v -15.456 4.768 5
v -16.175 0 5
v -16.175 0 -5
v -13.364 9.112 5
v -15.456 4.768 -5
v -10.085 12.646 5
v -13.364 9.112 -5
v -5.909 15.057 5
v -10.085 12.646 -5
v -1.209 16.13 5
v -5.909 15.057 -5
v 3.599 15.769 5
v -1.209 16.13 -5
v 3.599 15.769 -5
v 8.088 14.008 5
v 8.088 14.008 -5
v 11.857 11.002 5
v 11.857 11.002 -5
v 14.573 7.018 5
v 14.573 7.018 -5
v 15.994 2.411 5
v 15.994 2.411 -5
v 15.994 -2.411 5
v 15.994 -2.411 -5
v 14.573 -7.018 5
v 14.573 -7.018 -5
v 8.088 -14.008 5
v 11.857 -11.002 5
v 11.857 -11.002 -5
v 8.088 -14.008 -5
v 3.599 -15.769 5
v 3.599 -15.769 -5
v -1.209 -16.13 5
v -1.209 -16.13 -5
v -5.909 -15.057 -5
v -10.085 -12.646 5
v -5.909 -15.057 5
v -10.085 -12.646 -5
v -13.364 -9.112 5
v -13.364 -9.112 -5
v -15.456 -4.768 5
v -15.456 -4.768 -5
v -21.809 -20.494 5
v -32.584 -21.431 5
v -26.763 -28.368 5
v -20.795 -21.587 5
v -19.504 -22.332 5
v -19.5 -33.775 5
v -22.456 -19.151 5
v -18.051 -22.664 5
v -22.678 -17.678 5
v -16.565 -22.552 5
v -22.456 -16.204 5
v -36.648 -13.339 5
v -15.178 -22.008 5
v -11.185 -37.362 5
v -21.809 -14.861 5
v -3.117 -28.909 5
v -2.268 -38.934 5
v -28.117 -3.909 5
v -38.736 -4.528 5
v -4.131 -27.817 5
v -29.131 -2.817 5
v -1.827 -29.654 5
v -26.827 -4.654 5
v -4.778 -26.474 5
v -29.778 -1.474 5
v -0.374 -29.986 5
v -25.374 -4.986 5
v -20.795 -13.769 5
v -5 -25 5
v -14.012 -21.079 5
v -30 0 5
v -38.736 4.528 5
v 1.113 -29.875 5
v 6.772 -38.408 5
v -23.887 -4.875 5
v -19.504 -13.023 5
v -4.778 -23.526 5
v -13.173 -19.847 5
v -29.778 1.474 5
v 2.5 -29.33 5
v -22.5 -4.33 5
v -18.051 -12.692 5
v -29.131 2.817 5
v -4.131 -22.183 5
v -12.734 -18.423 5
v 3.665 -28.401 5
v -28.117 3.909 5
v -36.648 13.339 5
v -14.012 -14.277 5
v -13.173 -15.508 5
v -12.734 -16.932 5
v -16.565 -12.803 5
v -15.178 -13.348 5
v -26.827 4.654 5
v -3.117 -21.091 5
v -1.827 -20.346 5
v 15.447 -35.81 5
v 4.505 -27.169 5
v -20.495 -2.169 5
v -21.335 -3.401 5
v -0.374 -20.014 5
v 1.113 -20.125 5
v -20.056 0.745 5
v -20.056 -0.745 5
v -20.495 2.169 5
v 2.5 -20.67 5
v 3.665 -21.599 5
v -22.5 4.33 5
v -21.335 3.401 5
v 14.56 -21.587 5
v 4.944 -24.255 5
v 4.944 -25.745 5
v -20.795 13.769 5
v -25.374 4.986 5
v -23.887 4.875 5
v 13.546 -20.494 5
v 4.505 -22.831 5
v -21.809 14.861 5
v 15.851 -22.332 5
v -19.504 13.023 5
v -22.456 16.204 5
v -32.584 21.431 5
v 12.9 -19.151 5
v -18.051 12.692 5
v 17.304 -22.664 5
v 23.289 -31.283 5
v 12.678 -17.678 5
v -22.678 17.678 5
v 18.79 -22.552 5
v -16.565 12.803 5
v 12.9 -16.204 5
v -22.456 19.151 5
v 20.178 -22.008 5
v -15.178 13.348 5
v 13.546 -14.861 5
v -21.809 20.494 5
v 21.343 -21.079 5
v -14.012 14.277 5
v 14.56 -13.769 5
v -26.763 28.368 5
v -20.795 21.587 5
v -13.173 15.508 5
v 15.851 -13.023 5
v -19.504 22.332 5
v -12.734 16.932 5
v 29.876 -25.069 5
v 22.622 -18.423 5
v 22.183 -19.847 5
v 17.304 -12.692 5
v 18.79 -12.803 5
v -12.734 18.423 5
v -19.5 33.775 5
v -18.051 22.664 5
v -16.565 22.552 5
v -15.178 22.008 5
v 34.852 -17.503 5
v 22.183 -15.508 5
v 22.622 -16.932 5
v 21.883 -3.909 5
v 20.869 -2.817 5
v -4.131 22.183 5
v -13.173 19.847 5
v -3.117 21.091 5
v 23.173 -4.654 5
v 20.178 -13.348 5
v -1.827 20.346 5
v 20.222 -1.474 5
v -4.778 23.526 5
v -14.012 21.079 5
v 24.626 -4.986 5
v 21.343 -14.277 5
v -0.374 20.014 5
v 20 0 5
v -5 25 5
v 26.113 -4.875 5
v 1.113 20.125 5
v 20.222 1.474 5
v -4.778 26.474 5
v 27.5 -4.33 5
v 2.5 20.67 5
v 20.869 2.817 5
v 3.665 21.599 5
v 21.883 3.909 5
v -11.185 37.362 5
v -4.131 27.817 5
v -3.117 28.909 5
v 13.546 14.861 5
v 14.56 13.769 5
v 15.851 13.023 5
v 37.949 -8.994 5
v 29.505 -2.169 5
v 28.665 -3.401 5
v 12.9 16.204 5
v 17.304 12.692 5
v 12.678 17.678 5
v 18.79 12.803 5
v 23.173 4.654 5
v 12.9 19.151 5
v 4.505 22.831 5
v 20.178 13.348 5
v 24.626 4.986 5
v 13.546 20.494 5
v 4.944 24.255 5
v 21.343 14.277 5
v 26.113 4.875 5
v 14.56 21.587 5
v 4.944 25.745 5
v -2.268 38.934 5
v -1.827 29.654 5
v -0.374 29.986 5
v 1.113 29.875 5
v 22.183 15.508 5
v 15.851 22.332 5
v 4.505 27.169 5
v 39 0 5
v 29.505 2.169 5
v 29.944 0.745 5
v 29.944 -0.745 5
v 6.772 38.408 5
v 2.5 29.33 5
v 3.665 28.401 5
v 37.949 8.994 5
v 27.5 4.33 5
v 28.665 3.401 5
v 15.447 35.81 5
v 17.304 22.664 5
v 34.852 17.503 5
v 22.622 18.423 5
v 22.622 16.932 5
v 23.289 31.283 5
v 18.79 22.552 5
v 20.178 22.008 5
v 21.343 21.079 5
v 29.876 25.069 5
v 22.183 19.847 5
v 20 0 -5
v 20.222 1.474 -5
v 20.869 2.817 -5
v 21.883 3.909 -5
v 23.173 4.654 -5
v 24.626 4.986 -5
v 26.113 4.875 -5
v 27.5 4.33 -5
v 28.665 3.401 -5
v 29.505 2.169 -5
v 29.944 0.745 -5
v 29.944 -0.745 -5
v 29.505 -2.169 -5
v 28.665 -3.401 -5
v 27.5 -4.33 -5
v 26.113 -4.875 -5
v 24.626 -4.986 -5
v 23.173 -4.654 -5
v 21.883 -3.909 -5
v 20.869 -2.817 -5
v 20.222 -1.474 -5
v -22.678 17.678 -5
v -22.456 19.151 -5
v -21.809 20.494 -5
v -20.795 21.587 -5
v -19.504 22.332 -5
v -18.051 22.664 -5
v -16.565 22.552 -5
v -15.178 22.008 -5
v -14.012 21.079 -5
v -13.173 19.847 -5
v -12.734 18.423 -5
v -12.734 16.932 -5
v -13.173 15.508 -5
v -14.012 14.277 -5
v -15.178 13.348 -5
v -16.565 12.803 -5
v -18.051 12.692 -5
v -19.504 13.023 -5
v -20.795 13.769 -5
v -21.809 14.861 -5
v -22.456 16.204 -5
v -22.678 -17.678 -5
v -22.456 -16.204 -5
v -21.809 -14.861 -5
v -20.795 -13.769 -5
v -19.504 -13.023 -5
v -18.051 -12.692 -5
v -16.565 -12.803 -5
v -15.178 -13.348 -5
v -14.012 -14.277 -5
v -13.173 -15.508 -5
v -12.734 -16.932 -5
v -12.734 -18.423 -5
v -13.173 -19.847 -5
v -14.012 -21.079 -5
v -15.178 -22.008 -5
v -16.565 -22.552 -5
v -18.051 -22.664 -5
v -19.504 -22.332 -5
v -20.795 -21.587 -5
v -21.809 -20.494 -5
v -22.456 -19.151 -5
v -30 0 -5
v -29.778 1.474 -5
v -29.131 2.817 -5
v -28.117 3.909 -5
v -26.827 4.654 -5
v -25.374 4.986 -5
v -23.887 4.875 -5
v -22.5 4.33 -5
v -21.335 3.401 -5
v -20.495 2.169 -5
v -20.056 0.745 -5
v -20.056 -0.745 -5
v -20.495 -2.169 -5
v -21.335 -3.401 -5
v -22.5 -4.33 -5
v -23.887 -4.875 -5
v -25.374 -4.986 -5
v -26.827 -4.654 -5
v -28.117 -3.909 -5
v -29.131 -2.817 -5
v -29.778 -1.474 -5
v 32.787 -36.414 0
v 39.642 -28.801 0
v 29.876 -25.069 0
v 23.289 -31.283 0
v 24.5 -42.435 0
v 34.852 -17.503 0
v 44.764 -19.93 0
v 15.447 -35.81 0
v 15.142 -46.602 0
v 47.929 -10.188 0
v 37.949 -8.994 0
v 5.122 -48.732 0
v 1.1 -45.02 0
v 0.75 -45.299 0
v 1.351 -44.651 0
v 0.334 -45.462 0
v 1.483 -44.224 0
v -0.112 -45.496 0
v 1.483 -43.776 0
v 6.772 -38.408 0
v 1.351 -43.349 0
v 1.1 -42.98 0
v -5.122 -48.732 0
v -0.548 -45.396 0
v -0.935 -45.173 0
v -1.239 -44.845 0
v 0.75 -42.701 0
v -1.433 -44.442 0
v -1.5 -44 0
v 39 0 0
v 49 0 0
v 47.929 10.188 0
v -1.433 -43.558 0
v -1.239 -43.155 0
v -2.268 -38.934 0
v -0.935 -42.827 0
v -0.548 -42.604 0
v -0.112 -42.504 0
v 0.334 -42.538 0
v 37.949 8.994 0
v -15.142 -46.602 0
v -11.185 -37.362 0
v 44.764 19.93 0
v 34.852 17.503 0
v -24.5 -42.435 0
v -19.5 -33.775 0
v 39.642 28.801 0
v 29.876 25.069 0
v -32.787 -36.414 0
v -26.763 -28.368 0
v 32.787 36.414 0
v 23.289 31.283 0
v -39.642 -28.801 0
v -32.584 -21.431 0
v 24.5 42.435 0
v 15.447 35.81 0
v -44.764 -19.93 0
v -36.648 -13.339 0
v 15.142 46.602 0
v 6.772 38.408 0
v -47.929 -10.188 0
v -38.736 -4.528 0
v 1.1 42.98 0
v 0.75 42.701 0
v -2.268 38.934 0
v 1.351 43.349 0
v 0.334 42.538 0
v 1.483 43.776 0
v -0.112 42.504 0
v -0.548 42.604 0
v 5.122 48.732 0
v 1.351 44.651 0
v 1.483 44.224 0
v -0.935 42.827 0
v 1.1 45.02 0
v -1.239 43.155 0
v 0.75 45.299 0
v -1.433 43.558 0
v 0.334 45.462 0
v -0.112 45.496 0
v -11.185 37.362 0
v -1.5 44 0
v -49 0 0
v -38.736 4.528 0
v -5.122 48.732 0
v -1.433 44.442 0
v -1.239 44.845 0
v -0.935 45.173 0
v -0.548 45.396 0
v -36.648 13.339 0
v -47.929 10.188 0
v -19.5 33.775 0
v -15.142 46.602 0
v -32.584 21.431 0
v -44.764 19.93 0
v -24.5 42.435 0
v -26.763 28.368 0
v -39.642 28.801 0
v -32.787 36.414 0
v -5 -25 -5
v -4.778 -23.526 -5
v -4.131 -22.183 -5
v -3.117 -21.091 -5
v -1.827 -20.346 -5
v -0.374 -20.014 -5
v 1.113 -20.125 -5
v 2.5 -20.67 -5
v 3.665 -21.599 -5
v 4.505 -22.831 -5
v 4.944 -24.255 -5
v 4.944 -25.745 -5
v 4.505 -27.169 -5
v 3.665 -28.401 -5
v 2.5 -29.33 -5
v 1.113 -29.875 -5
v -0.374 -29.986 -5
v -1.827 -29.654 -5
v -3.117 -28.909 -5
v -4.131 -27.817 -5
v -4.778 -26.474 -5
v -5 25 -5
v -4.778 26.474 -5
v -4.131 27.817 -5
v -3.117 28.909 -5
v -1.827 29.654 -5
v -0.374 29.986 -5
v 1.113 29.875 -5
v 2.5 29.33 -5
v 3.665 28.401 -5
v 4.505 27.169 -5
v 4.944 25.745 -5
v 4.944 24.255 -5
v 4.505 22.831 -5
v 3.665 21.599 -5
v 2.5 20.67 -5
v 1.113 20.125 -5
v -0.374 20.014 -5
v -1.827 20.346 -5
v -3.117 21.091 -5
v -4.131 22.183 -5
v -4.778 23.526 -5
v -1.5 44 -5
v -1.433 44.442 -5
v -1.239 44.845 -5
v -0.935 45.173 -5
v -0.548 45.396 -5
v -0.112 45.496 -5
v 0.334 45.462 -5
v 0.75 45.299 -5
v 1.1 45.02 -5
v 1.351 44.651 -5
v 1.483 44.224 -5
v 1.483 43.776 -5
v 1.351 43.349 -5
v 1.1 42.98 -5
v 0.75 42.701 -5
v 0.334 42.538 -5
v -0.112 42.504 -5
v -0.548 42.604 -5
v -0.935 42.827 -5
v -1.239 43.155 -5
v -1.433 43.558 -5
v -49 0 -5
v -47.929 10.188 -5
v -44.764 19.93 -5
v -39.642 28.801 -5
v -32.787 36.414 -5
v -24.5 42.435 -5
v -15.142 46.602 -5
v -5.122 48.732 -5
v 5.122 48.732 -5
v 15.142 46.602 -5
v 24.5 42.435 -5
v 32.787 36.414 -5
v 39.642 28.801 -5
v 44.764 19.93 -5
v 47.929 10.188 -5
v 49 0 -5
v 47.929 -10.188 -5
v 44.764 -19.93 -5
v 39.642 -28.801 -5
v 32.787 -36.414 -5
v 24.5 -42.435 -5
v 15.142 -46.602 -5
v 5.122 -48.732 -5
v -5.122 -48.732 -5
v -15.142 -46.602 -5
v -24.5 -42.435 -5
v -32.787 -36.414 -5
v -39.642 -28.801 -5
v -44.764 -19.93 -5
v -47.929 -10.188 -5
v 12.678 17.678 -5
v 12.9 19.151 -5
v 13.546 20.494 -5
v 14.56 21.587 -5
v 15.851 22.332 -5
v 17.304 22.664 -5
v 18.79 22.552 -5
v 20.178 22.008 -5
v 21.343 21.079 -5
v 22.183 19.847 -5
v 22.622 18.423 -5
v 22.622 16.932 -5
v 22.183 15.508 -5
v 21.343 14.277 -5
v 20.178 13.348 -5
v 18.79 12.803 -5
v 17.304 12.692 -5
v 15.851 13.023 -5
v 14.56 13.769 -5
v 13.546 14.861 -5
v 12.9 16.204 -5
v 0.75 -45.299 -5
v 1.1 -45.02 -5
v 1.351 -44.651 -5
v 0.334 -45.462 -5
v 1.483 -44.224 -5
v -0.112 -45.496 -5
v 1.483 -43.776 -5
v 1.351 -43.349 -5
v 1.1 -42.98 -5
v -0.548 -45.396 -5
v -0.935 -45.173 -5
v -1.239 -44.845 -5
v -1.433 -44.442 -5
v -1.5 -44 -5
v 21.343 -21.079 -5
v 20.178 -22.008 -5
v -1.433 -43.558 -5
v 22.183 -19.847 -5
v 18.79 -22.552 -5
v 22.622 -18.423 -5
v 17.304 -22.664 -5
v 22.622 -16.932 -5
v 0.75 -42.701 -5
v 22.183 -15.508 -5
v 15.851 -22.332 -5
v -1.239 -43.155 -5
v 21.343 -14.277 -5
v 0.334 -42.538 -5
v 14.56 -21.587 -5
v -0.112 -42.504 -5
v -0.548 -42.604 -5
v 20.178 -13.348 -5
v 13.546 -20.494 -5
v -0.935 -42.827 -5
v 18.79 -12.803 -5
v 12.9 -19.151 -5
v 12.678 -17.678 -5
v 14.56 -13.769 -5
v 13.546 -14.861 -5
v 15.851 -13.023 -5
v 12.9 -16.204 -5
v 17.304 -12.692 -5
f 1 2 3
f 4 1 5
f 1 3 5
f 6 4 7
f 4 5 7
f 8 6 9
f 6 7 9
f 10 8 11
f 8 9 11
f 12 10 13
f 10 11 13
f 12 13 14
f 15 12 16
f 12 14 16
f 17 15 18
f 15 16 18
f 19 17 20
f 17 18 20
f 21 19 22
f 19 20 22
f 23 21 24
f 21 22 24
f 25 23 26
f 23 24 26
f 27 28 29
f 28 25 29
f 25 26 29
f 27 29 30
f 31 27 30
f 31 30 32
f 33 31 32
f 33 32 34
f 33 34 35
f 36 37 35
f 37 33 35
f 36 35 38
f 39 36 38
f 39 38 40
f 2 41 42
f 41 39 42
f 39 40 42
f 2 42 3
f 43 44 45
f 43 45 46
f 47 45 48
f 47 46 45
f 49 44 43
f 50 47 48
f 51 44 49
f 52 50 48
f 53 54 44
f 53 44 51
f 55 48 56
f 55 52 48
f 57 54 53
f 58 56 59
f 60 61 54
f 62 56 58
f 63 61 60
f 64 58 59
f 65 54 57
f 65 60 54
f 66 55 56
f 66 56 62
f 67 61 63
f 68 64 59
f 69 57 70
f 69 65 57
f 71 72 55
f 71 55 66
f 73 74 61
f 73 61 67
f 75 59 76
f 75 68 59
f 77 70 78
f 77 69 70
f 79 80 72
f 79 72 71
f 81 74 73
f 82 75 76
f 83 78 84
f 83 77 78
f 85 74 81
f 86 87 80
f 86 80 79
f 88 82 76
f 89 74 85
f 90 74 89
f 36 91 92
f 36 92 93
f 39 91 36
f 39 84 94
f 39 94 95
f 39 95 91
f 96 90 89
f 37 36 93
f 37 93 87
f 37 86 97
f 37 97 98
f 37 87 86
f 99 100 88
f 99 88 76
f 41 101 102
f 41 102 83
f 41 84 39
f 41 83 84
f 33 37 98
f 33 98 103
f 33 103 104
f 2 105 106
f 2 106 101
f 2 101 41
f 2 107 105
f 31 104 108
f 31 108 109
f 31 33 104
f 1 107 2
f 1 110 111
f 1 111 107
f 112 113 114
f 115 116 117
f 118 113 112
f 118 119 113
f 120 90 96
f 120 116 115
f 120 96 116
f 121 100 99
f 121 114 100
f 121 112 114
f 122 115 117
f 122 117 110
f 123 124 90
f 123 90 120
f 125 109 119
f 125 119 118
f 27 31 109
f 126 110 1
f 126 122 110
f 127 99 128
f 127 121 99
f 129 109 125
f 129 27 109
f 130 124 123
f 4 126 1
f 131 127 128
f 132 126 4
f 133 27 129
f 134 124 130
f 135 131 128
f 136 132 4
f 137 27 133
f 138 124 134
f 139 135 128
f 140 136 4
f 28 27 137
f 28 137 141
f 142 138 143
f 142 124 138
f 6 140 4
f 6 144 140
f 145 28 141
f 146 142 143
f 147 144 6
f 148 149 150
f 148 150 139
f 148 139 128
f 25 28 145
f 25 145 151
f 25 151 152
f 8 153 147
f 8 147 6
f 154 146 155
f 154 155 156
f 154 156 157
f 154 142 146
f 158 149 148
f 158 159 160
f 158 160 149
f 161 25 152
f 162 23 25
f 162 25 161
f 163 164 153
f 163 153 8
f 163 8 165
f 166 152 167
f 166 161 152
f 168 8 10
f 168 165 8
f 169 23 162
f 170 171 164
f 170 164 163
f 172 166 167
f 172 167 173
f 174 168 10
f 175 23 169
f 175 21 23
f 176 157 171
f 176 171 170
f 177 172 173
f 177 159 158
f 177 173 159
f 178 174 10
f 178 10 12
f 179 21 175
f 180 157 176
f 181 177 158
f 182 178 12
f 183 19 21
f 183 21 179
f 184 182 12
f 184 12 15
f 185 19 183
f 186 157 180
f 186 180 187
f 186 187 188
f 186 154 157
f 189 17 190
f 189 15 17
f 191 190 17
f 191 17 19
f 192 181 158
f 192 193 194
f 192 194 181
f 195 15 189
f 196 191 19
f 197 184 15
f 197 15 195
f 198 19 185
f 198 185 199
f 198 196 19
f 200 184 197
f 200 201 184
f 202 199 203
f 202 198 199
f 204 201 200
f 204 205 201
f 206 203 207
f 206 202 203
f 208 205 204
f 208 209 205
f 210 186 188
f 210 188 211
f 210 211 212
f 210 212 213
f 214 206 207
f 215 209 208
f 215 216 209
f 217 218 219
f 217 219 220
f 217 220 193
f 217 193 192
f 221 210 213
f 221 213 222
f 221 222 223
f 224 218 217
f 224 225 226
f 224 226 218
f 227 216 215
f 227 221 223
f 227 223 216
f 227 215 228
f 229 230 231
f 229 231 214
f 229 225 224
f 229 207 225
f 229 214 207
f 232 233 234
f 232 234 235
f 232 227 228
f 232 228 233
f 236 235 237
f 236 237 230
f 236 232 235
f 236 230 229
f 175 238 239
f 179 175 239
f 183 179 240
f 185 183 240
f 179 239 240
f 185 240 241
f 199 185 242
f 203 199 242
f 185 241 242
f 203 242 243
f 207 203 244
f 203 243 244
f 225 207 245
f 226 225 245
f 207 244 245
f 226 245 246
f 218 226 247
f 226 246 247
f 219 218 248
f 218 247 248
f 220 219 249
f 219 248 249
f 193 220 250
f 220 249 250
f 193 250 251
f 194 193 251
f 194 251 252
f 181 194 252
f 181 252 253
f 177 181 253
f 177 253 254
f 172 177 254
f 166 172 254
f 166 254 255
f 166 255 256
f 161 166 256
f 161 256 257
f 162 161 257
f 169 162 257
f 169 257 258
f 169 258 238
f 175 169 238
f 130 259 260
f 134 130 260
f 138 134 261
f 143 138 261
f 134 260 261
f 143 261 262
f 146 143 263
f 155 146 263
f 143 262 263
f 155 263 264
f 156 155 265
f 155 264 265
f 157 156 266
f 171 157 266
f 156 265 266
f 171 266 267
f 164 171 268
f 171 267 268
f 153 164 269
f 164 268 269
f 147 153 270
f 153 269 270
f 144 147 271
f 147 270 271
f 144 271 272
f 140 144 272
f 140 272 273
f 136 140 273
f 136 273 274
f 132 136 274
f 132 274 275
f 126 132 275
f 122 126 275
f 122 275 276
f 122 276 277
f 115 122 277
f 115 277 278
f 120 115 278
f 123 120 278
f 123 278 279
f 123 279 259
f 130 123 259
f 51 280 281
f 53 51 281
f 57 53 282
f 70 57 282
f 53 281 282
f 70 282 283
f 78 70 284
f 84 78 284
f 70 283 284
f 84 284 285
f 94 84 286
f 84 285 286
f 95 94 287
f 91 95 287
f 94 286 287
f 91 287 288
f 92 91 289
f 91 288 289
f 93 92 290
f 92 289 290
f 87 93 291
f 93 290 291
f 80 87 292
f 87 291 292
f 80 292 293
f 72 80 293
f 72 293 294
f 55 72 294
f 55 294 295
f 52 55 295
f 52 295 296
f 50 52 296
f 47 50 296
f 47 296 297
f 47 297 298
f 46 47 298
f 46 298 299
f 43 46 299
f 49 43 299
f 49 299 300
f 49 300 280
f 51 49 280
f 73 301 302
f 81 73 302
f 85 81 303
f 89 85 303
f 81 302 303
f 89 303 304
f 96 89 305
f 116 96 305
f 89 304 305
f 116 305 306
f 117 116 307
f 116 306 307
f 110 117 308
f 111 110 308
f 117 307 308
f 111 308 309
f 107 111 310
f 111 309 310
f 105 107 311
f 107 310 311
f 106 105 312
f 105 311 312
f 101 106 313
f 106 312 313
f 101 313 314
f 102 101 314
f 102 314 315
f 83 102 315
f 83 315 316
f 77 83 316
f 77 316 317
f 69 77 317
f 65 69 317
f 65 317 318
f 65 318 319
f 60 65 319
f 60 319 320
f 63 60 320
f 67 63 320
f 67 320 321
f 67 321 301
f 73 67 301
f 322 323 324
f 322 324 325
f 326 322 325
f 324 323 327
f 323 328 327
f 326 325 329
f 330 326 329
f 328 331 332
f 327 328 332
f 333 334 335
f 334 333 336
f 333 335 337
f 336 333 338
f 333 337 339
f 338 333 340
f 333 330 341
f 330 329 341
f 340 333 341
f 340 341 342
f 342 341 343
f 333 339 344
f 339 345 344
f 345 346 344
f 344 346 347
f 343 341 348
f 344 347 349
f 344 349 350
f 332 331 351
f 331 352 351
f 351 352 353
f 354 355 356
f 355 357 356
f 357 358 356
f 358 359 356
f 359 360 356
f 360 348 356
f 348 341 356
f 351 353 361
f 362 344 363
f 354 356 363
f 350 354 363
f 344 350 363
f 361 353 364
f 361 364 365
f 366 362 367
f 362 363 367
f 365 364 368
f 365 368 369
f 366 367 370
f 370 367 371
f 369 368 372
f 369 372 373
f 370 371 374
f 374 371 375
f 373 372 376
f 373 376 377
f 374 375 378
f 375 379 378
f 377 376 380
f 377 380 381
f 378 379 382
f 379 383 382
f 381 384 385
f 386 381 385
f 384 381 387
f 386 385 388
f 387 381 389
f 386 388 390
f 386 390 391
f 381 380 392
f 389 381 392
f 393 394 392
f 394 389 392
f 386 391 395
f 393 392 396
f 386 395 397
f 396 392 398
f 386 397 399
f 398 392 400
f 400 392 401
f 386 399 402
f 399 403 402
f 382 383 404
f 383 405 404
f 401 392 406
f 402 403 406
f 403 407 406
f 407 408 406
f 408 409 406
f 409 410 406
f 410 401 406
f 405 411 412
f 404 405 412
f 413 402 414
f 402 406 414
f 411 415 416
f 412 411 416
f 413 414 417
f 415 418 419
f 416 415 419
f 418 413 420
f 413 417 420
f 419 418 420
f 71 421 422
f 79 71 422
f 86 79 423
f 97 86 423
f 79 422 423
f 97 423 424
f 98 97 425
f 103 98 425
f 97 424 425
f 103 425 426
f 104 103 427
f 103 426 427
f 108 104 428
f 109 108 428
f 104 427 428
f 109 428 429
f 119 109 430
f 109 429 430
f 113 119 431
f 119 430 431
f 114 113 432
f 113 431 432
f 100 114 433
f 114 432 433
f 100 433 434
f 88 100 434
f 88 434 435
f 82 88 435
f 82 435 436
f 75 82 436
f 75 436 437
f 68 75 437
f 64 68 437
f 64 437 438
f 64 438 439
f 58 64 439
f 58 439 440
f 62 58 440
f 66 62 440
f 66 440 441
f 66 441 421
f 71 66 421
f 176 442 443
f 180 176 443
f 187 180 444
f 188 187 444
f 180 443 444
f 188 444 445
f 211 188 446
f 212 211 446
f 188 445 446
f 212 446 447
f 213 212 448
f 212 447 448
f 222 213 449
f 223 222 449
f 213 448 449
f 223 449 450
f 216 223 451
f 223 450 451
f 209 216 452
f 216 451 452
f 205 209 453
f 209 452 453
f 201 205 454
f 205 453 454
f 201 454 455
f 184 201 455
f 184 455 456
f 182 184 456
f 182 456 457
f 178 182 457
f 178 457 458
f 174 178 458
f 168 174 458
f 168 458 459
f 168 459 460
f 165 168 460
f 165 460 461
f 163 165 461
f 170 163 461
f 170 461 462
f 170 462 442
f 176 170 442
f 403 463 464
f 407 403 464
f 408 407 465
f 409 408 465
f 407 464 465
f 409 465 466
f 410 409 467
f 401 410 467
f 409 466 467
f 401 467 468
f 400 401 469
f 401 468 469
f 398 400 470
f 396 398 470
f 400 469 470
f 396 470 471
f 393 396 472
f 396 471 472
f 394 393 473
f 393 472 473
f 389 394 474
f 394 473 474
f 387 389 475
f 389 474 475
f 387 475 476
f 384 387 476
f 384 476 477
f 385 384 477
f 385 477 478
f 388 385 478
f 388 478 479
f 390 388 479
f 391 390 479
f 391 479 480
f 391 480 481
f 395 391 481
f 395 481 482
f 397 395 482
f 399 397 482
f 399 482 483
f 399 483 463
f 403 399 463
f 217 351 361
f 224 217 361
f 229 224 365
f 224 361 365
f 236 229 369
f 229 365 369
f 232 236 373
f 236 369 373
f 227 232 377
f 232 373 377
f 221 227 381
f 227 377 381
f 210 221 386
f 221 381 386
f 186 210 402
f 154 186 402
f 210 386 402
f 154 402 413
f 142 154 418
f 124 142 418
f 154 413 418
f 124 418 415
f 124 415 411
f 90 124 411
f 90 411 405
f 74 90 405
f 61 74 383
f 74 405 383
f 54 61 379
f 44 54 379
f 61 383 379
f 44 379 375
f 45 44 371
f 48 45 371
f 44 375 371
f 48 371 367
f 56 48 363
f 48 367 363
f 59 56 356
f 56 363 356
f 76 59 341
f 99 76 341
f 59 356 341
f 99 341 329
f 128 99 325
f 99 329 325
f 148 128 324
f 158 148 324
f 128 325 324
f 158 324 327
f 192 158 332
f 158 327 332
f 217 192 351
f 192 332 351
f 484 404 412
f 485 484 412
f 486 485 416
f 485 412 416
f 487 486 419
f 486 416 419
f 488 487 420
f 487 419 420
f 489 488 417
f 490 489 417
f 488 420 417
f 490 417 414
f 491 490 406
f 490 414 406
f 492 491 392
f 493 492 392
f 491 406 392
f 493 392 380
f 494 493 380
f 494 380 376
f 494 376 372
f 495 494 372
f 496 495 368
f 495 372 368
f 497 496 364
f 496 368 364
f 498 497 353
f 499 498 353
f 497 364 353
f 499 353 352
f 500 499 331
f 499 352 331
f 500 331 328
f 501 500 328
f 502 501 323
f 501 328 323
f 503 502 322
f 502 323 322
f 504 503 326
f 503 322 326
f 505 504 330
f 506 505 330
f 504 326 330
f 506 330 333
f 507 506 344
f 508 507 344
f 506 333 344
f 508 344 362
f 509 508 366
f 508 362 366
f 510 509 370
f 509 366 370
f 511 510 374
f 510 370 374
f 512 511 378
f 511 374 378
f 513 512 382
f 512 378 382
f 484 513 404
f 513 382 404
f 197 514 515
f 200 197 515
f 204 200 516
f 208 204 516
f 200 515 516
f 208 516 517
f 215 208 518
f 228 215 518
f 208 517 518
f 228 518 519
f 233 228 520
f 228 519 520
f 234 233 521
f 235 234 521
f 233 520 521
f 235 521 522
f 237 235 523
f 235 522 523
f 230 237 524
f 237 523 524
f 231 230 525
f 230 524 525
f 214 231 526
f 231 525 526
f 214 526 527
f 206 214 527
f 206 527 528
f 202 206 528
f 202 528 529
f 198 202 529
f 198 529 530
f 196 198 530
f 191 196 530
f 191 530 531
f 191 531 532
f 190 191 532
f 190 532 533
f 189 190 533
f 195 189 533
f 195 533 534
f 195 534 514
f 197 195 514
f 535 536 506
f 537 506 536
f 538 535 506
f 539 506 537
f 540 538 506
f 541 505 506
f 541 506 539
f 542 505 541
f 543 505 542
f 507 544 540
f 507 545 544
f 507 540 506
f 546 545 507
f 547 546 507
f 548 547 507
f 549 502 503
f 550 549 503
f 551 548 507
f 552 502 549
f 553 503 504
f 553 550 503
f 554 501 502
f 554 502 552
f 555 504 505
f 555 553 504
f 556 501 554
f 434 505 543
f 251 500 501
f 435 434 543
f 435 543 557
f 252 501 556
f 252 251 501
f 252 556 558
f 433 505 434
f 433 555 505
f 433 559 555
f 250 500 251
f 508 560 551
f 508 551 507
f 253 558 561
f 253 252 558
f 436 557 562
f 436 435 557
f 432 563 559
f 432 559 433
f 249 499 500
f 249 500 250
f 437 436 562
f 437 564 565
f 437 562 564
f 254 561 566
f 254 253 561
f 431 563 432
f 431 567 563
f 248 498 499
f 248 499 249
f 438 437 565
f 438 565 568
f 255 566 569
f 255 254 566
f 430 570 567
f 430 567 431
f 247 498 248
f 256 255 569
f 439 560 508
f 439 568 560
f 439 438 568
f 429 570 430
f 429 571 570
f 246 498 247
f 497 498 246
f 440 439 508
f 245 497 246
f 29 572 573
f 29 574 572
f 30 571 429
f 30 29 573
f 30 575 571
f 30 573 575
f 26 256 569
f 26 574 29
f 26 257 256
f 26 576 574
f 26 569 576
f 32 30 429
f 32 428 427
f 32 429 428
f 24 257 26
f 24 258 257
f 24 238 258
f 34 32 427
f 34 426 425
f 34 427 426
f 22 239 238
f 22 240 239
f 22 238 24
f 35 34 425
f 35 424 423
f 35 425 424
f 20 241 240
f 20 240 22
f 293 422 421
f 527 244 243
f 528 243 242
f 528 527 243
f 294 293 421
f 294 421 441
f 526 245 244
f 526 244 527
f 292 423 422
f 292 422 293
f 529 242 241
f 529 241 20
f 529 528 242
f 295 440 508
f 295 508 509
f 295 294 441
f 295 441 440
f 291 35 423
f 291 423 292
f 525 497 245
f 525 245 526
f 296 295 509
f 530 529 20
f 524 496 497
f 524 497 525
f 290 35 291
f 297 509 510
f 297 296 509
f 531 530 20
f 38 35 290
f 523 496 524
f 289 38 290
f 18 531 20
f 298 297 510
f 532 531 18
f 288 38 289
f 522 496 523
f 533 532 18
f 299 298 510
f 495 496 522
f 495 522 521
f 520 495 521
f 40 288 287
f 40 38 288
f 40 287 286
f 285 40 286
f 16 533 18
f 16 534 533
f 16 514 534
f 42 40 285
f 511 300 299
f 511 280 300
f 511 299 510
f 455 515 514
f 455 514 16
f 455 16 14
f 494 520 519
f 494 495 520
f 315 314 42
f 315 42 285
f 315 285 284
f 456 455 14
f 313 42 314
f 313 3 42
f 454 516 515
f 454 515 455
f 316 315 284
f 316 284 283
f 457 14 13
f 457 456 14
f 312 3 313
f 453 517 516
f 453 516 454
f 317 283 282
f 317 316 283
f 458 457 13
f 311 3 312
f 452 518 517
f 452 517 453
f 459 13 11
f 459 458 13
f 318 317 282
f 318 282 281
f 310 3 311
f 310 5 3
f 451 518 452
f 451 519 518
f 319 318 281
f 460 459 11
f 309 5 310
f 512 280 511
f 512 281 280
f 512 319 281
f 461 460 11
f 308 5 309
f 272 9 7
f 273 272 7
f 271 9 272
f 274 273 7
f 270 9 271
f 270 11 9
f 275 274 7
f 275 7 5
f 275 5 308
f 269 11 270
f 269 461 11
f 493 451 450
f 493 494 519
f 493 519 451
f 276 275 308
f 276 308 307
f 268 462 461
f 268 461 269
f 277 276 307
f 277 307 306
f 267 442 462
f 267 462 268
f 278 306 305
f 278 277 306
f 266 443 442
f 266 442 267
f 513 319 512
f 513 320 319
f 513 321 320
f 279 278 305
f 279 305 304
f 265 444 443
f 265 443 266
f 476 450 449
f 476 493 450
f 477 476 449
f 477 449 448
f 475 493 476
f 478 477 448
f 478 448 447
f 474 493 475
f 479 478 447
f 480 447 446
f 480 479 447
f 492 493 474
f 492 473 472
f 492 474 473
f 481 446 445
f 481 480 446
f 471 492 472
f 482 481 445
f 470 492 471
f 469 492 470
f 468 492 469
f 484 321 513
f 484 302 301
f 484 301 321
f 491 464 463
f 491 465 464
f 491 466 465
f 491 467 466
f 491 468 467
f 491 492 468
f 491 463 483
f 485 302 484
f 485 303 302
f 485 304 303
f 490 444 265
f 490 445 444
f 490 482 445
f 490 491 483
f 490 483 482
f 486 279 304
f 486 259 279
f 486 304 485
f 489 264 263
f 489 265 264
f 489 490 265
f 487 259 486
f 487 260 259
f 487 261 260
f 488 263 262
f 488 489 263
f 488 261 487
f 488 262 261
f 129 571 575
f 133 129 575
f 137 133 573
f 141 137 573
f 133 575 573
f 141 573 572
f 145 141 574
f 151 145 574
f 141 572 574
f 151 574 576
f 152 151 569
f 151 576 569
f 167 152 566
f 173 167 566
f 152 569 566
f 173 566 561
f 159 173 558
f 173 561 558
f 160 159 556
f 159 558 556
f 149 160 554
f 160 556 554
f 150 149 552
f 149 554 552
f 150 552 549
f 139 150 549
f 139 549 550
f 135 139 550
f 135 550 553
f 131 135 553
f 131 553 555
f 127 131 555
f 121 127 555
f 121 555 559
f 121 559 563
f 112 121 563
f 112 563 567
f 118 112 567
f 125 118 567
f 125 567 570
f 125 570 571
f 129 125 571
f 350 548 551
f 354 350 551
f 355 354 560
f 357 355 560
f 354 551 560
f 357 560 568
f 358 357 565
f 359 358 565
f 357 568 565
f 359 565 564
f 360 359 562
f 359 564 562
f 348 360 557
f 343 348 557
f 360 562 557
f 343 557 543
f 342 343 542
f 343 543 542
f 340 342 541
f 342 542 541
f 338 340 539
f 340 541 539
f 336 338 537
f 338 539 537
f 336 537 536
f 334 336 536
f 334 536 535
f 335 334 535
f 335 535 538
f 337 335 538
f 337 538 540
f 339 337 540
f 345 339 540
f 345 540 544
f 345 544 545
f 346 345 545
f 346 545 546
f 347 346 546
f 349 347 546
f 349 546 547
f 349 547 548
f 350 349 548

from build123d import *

# Parameters (mm, degrees)
ESQUISSE1_R             = 39
ESQUISSE1_R_2           = 16.175
BOSS_EXTRU_1_DEPTH      = 5
ESQUISSE2_R             = 49
BOSS_EXTRU_2_DEPTH      = 5
ESQUISSE3_R             = 16.175
ENL_V_MAT_EXTRU_1_DEPTH = 11
ESQUISSE4_R             = 1.5
ESQUISSE4_R_2           = 5
ENL_V_MAT_EXTRU_2_DEPTH = 11


with BuildPart() as part:
    # Esquisse1 → Boss.-Extru.1 (new body)
    with BuildSketch(Plane.XY):
        Circle(ESQUISSE1_R)
        Circle(ESQUISSE1_R_2, mode=Mode.SUBTRACT)
    extrude(amount=BOSS_EXTRU_1_DEPTH)

    # Esquisse2 → Boss.-Extru.2 (add)
    with BuildSketch(Plane(origin=(0, 0, 0), x_dir=(-1, 0, 0), z_dir=(0, 0, -1))):
        Circle(ESQUISSE2_R)
    extrude(amount=BOSS_EXTRU_2_DEPTH)

    # Esquisse3 → Enlèv. mat.-Extru.1 (cut, through all)
    with BuildSketch(Plane(origin=(0, 0, -5), x_dir=(-1, 0, 0), z_dir=(0, 0, -1))):
        Circle(ESQUISSE3_R)
    extrude(amount=-ENL_V_MAT_EXTRU_1_DEPTH, mode=Mode.SUBTRACT)

    # Esquisse4 → Enlèv. mat.-Extru.2 (cut, through all)
    with BuildSketch(Plane(origin=(0, 0, -5), x_dir=(-1, 0, 0), z_dir=(0, 0, -1))):
        with Locations((0, 44)):
            Circle(ESQUISSE4_R)
        with Locations((0, -44)):
            Circle(ESQUISSE4_R)
        with Locations((25, 0)):
            Circle(ESQUISSE4_R_2)
        with Locations((0, 25)):
            Circle(ESQUISSE4_R_2)
        with Locations((-25, 0)):
            Circle(ESQUISSE4_R_2)
        with Locations((0, -25)):
            Circle(ESQUISSE4_R_2)
        with Locations((-17.67766953, -17.67766953)):
            Circle(ESQUISSE4_R_2)
        with Locations((17.67766953, 17.67766953)):
            Circle(ESQUISSE4_R_2)
        with Locations((17.67766953, -17.67766953)):
            Circle(ESQUISSE4_R_2)
        with Locations((-17.67766953, 17.67766953)):
            Circle(ESQUISSE4_R_2)
    extrude(amount=-ENL_V_MAT_EXTRU_2_DEPTH, mode=Mode.SUBTRACT)


solid = part.part
